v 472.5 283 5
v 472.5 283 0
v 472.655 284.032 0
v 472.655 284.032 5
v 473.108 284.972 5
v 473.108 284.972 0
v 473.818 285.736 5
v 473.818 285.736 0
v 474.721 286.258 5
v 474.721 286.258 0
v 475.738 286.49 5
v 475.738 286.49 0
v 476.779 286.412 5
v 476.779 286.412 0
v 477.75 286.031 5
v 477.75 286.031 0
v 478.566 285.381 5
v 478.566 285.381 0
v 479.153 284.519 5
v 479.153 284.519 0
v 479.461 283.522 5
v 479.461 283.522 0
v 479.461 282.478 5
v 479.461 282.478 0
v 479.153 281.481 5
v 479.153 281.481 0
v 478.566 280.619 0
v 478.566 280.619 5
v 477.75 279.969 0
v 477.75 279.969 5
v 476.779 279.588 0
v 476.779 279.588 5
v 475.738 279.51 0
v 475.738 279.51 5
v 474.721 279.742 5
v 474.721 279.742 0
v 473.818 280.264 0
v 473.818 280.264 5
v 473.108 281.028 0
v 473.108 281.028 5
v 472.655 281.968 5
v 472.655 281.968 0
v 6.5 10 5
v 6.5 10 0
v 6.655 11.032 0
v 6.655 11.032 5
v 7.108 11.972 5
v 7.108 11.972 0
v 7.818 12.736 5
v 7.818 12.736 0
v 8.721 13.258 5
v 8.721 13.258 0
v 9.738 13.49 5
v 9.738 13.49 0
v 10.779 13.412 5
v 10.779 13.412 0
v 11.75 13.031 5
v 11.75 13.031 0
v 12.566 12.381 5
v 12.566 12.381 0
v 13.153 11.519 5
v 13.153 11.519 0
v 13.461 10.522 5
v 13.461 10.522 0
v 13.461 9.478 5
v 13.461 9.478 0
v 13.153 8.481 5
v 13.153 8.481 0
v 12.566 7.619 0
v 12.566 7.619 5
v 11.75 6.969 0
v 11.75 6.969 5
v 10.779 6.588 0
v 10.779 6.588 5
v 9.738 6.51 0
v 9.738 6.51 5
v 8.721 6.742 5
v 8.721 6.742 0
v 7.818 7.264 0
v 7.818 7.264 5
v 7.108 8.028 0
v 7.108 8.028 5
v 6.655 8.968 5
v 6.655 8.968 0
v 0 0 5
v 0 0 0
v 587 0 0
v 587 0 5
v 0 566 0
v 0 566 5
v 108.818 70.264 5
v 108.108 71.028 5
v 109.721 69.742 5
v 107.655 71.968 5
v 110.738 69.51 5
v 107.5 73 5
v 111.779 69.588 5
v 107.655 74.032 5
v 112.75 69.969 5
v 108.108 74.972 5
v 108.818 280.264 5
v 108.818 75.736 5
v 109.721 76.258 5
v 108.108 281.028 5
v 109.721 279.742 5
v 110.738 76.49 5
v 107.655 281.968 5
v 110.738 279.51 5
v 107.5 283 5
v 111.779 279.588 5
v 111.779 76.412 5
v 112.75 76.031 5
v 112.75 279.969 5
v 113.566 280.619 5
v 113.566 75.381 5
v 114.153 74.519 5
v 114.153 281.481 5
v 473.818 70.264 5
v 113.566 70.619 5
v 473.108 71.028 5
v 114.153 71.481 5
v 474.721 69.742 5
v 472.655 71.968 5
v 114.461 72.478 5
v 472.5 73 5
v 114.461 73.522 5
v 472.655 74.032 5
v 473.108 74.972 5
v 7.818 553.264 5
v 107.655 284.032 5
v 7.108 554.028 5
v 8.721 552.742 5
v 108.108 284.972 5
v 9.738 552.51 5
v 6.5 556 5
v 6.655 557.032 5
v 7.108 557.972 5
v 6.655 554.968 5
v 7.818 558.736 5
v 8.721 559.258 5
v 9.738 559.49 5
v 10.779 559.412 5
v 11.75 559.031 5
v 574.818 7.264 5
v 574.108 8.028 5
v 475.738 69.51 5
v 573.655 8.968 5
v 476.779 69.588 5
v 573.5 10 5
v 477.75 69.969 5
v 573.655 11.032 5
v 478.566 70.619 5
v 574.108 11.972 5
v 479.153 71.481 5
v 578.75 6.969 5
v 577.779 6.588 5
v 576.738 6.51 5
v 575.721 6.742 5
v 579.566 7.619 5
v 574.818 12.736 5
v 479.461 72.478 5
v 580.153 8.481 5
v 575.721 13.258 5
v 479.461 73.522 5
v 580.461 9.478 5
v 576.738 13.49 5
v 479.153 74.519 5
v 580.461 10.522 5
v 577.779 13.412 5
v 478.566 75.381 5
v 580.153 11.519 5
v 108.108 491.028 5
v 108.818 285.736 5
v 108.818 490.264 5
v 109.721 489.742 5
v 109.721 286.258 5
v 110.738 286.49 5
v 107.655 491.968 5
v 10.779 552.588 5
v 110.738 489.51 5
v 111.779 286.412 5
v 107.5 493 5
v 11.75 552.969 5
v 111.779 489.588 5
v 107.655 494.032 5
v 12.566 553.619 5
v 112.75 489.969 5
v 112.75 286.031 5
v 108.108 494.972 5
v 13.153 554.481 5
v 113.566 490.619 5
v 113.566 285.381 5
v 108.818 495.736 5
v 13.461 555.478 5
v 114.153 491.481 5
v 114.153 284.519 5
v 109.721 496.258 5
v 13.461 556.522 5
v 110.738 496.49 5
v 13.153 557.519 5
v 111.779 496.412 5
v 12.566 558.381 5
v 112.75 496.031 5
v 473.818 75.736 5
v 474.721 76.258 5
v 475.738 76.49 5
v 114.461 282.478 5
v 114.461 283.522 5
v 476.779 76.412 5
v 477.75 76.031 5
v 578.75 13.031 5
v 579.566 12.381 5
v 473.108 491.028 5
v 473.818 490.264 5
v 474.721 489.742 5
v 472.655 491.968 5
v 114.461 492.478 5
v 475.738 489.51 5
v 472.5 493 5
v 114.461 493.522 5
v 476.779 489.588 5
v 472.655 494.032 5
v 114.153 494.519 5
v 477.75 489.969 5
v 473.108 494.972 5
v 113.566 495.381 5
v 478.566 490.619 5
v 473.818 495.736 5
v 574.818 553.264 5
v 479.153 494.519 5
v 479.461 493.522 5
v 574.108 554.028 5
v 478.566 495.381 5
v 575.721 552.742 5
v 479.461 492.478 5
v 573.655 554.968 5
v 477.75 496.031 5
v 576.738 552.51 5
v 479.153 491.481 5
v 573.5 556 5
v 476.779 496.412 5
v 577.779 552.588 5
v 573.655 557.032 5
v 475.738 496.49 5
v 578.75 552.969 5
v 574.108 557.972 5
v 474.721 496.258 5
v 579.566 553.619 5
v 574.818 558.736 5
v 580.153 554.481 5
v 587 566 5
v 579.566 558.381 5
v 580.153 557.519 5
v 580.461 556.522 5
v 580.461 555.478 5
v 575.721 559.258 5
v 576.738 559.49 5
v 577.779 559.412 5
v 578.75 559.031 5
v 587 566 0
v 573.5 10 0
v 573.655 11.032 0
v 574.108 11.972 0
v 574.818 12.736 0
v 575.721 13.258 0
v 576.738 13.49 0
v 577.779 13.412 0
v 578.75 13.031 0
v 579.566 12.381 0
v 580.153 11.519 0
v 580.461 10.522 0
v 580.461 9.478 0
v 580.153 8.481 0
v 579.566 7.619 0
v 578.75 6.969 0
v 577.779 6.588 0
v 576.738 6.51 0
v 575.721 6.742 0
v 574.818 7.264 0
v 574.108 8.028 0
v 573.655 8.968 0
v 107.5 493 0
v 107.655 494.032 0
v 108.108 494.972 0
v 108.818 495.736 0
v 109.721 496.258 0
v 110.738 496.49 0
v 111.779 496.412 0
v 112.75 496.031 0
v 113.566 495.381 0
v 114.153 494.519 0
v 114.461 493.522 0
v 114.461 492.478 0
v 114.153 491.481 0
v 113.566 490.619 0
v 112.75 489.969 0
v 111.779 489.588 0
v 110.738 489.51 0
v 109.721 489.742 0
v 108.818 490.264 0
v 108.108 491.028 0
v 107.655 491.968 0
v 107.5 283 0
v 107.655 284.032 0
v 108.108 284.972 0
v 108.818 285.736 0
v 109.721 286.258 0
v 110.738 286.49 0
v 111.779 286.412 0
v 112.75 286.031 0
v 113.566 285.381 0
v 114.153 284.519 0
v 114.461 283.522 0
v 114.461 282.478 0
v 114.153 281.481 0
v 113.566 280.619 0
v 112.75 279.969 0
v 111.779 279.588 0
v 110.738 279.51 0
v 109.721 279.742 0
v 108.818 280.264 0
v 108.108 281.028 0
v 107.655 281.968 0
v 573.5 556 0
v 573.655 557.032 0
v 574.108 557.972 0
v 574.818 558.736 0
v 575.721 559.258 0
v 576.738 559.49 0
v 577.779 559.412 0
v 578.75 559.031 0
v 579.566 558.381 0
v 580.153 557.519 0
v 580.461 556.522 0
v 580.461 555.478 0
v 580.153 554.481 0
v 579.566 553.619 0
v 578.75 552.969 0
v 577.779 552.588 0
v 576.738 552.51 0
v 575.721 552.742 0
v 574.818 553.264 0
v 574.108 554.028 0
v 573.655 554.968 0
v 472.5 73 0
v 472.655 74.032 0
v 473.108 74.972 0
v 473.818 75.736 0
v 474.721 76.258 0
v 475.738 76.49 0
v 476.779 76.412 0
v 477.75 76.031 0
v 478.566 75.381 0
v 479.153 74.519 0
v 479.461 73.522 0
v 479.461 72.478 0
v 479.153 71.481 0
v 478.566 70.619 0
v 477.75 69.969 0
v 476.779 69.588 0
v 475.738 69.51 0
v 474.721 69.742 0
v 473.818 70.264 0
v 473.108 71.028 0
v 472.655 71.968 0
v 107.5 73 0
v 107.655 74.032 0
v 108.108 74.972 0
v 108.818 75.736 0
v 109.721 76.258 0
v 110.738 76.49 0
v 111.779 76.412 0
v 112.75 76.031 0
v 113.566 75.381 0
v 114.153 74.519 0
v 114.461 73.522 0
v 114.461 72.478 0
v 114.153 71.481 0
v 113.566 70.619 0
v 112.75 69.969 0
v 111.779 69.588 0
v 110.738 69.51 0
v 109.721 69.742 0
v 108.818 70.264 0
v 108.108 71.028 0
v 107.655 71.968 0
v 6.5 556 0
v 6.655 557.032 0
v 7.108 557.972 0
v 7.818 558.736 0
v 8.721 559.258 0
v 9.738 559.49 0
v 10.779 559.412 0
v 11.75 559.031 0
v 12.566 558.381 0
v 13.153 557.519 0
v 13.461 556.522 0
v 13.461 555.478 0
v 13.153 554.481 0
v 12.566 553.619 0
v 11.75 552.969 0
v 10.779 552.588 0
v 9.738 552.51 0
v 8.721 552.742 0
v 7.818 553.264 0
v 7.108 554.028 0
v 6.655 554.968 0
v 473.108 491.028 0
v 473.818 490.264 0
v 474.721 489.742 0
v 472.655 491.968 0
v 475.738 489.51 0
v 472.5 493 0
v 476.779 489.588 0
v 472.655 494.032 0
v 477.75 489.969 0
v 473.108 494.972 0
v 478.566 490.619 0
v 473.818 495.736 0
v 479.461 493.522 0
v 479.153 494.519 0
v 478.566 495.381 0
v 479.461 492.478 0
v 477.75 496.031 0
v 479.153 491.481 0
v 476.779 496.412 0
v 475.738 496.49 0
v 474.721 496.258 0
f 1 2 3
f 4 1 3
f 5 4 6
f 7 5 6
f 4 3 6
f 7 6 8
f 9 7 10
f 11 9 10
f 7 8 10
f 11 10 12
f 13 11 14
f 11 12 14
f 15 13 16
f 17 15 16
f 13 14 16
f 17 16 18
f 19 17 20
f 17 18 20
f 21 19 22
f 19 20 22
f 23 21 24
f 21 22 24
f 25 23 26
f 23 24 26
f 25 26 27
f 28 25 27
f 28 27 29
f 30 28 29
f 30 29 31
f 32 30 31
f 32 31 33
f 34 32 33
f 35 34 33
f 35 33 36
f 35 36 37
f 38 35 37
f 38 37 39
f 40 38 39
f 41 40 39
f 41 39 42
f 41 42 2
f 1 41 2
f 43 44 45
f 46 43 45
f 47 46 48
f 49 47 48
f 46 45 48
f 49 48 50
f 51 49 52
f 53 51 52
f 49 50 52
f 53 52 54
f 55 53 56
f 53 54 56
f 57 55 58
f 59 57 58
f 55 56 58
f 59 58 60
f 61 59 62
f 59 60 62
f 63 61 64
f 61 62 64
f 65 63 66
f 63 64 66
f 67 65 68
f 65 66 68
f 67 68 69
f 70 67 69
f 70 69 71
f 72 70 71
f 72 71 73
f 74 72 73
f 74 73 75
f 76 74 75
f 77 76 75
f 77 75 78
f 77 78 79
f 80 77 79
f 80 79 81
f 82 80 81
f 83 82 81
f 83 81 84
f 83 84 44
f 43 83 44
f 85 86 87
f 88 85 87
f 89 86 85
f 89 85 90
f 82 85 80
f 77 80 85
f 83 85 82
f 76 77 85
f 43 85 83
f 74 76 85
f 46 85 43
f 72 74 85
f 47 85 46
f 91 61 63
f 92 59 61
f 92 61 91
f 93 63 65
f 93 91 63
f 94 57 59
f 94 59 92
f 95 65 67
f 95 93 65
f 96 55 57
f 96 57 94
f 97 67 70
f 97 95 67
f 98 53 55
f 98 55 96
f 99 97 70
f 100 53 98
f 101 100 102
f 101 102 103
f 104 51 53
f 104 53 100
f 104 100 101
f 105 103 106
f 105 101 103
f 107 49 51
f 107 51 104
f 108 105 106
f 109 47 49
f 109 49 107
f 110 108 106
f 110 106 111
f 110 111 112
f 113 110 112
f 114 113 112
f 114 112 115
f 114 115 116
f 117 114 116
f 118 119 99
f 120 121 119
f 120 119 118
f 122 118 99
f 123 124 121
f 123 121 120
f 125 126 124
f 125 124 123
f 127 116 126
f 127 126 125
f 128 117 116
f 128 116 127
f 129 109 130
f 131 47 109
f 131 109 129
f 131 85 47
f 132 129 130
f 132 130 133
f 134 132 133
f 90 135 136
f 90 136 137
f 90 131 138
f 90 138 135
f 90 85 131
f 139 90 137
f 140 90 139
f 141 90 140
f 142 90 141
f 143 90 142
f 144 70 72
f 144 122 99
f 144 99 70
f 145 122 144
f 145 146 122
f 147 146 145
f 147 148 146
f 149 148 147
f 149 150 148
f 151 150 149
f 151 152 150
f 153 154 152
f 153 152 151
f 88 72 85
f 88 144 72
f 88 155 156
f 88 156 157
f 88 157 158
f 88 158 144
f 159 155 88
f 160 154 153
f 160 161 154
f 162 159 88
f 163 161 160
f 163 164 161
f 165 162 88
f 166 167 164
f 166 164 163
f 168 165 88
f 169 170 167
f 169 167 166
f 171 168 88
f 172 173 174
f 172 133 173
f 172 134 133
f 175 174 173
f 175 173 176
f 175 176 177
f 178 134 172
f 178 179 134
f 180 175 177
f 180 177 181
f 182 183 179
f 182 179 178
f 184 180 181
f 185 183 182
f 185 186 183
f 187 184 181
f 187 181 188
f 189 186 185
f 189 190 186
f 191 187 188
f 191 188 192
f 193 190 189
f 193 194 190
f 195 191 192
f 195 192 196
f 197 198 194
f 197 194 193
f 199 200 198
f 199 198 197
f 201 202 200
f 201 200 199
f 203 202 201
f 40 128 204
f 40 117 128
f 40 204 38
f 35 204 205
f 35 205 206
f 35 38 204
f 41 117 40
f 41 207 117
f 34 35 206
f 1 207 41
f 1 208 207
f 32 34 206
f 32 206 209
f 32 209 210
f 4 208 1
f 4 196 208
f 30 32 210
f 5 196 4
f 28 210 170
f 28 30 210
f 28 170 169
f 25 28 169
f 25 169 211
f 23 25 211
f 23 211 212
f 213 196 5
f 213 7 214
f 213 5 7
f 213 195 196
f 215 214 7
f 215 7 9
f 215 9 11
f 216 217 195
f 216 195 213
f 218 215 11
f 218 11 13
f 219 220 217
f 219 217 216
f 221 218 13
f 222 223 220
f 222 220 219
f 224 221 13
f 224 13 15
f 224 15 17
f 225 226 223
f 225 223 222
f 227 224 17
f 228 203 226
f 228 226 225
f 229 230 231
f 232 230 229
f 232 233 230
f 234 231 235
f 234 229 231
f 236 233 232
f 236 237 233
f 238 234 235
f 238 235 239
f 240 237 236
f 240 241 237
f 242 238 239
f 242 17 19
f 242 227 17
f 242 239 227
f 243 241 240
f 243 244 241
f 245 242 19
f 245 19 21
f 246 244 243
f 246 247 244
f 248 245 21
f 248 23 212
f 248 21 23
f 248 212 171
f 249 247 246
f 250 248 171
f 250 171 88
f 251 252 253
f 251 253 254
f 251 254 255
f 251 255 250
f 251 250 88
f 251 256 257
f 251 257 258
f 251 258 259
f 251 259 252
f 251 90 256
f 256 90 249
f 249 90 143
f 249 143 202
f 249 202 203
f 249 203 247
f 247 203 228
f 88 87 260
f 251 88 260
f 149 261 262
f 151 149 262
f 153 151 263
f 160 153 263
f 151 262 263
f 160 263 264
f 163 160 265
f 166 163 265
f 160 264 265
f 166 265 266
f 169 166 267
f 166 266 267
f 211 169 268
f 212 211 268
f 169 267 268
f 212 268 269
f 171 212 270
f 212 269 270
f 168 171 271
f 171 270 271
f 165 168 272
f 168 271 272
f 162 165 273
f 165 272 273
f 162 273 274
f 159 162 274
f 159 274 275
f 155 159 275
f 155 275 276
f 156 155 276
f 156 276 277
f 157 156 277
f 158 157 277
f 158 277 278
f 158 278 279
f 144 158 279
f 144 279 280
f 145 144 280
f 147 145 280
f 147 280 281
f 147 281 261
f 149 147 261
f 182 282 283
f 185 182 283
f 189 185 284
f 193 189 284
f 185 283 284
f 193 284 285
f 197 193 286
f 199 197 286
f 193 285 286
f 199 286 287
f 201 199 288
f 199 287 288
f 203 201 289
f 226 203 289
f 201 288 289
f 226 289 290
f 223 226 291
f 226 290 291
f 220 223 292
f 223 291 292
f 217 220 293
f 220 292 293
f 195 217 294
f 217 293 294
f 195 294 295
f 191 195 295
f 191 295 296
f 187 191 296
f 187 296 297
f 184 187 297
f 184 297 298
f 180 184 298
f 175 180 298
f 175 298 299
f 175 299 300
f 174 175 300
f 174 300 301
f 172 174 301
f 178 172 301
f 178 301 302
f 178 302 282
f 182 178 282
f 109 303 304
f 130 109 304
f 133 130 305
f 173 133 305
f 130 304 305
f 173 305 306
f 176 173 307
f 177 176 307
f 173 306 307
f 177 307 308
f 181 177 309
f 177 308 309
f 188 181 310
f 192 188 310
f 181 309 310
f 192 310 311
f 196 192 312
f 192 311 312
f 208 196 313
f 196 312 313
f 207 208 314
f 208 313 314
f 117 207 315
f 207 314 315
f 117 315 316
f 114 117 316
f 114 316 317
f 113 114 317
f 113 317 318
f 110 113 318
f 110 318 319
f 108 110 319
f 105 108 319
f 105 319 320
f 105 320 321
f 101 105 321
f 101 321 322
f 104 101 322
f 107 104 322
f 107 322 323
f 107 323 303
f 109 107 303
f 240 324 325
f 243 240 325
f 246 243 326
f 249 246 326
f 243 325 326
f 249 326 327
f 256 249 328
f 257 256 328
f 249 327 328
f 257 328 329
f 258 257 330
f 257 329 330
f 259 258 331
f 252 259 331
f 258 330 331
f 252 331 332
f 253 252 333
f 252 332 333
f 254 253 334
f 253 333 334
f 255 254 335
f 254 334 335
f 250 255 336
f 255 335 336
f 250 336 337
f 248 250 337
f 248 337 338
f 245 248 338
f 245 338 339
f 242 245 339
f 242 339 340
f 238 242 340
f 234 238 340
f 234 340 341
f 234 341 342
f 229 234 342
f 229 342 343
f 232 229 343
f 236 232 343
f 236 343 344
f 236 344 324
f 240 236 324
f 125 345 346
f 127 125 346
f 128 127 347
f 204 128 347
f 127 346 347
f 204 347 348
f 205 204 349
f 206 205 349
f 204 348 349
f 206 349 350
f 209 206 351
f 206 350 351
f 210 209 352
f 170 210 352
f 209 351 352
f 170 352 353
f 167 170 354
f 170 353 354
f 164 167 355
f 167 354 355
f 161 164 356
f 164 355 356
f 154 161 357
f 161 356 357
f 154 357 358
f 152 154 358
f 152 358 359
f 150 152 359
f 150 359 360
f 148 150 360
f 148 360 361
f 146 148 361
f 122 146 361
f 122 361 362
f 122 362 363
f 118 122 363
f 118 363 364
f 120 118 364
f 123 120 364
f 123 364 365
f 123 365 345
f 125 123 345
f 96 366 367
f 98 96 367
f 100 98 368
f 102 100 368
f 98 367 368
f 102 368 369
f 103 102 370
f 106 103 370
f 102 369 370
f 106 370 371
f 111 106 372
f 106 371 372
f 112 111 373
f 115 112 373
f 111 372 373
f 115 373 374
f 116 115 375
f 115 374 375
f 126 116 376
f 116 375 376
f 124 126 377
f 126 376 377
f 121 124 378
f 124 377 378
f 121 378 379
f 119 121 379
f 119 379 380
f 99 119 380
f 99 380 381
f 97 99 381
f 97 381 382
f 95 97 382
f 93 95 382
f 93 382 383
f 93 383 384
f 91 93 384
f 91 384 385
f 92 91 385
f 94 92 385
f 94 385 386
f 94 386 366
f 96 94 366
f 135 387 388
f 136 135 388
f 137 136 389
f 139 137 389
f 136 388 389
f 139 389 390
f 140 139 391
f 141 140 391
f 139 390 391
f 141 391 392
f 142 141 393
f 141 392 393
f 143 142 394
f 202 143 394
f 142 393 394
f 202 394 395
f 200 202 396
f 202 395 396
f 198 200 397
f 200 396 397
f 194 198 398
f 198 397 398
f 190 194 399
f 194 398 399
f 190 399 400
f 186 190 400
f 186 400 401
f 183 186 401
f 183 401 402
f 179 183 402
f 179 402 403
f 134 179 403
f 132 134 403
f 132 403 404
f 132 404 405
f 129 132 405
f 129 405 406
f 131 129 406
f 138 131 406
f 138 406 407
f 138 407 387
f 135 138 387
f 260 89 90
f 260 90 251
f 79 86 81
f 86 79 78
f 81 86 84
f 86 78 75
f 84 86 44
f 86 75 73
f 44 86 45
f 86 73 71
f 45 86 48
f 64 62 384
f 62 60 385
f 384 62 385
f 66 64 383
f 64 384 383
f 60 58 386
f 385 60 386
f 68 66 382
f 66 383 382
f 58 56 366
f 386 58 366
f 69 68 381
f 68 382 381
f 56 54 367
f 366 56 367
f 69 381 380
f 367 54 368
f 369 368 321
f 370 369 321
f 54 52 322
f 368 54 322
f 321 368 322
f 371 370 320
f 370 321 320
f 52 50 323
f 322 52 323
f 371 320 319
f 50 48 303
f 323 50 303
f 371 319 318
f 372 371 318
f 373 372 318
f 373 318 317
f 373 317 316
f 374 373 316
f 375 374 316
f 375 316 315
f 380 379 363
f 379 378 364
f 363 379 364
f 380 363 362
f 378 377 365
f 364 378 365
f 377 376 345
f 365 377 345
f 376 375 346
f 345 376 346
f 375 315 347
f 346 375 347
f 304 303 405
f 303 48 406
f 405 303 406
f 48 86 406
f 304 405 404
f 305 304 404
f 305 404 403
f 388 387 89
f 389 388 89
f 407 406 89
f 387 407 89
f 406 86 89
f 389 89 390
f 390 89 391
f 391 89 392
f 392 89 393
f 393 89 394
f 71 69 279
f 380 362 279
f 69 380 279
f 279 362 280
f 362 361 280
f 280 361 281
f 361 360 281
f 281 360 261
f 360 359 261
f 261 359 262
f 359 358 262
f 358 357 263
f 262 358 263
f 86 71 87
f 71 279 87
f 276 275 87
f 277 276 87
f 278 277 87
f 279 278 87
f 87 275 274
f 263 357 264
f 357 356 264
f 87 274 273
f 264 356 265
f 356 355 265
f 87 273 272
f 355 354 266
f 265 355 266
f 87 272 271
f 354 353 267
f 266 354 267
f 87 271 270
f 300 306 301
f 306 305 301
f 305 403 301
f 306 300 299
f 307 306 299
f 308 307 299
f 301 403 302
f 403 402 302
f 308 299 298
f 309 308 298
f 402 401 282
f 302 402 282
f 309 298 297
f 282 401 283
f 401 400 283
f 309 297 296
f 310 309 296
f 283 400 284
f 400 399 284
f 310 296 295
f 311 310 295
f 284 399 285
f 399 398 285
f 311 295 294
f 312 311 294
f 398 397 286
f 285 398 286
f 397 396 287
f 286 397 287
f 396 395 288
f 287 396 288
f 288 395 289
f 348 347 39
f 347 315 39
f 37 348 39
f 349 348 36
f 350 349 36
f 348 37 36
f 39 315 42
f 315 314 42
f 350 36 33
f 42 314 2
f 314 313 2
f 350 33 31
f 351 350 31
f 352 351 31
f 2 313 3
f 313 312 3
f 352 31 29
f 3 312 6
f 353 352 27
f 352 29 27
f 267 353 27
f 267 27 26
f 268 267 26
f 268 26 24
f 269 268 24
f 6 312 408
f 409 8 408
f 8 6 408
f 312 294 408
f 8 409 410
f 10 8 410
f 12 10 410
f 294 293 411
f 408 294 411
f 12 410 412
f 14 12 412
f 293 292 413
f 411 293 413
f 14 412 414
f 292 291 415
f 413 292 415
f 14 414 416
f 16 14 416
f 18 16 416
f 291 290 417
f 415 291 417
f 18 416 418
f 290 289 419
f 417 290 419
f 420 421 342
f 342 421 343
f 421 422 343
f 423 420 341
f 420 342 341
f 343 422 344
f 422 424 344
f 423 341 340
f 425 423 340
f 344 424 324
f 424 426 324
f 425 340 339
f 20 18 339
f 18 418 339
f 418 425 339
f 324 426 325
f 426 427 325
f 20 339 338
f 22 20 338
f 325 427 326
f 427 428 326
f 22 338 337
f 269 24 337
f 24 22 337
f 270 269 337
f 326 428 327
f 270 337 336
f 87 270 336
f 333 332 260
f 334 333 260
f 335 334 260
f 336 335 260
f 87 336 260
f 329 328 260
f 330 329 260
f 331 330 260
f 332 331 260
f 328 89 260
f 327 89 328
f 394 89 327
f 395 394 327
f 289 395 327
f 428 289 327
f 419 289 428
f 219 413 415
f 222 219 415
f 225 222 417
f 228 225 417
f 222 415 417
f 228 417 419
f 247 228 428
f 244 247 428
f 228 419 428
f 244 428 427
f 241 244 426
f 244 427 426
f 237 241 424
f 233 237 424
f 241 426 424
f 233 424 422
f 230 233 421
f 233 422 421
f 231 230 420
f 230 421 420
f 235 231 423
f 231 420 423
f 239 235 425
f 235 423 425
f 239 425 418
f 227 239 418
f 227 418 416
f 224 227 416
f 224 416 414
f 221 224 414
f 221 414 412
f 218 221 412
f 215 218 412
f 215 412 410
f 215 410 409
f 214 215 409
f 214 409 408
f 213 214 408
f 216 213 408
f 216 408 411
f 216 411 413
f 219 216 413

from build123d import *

# Parameters (mm, degrees)
F0_W     = 587
F0_H     = 566
F1_DEPTH = 5
F3_D     = 7
F5_D     = 7


with BuildPart() as f1:
    # F0 (on Top) → F1 (new body)
    with BuildSketch(Plane.XY):
        with Locations((293.5, 283)):
            Rectangle(F0_W, F0_H)
    extrude(amount=F1_DEPTH)

    # F3 (through all)
    with Locations(Plane.XY.offset(5)):
        with Locations((10, 556), (577, 556), (577, 10), (10, 10)):
            Hole(F3_D / 2)

    # F5 (through all)
    with Locations(Plane.XY.offset(5)):
        with Locations((111, 493), (476, 493), (111, 283), (476, 283), (111, 73), (476, 73)):
            Hole(F5_D / 2)


solid = f1.part
